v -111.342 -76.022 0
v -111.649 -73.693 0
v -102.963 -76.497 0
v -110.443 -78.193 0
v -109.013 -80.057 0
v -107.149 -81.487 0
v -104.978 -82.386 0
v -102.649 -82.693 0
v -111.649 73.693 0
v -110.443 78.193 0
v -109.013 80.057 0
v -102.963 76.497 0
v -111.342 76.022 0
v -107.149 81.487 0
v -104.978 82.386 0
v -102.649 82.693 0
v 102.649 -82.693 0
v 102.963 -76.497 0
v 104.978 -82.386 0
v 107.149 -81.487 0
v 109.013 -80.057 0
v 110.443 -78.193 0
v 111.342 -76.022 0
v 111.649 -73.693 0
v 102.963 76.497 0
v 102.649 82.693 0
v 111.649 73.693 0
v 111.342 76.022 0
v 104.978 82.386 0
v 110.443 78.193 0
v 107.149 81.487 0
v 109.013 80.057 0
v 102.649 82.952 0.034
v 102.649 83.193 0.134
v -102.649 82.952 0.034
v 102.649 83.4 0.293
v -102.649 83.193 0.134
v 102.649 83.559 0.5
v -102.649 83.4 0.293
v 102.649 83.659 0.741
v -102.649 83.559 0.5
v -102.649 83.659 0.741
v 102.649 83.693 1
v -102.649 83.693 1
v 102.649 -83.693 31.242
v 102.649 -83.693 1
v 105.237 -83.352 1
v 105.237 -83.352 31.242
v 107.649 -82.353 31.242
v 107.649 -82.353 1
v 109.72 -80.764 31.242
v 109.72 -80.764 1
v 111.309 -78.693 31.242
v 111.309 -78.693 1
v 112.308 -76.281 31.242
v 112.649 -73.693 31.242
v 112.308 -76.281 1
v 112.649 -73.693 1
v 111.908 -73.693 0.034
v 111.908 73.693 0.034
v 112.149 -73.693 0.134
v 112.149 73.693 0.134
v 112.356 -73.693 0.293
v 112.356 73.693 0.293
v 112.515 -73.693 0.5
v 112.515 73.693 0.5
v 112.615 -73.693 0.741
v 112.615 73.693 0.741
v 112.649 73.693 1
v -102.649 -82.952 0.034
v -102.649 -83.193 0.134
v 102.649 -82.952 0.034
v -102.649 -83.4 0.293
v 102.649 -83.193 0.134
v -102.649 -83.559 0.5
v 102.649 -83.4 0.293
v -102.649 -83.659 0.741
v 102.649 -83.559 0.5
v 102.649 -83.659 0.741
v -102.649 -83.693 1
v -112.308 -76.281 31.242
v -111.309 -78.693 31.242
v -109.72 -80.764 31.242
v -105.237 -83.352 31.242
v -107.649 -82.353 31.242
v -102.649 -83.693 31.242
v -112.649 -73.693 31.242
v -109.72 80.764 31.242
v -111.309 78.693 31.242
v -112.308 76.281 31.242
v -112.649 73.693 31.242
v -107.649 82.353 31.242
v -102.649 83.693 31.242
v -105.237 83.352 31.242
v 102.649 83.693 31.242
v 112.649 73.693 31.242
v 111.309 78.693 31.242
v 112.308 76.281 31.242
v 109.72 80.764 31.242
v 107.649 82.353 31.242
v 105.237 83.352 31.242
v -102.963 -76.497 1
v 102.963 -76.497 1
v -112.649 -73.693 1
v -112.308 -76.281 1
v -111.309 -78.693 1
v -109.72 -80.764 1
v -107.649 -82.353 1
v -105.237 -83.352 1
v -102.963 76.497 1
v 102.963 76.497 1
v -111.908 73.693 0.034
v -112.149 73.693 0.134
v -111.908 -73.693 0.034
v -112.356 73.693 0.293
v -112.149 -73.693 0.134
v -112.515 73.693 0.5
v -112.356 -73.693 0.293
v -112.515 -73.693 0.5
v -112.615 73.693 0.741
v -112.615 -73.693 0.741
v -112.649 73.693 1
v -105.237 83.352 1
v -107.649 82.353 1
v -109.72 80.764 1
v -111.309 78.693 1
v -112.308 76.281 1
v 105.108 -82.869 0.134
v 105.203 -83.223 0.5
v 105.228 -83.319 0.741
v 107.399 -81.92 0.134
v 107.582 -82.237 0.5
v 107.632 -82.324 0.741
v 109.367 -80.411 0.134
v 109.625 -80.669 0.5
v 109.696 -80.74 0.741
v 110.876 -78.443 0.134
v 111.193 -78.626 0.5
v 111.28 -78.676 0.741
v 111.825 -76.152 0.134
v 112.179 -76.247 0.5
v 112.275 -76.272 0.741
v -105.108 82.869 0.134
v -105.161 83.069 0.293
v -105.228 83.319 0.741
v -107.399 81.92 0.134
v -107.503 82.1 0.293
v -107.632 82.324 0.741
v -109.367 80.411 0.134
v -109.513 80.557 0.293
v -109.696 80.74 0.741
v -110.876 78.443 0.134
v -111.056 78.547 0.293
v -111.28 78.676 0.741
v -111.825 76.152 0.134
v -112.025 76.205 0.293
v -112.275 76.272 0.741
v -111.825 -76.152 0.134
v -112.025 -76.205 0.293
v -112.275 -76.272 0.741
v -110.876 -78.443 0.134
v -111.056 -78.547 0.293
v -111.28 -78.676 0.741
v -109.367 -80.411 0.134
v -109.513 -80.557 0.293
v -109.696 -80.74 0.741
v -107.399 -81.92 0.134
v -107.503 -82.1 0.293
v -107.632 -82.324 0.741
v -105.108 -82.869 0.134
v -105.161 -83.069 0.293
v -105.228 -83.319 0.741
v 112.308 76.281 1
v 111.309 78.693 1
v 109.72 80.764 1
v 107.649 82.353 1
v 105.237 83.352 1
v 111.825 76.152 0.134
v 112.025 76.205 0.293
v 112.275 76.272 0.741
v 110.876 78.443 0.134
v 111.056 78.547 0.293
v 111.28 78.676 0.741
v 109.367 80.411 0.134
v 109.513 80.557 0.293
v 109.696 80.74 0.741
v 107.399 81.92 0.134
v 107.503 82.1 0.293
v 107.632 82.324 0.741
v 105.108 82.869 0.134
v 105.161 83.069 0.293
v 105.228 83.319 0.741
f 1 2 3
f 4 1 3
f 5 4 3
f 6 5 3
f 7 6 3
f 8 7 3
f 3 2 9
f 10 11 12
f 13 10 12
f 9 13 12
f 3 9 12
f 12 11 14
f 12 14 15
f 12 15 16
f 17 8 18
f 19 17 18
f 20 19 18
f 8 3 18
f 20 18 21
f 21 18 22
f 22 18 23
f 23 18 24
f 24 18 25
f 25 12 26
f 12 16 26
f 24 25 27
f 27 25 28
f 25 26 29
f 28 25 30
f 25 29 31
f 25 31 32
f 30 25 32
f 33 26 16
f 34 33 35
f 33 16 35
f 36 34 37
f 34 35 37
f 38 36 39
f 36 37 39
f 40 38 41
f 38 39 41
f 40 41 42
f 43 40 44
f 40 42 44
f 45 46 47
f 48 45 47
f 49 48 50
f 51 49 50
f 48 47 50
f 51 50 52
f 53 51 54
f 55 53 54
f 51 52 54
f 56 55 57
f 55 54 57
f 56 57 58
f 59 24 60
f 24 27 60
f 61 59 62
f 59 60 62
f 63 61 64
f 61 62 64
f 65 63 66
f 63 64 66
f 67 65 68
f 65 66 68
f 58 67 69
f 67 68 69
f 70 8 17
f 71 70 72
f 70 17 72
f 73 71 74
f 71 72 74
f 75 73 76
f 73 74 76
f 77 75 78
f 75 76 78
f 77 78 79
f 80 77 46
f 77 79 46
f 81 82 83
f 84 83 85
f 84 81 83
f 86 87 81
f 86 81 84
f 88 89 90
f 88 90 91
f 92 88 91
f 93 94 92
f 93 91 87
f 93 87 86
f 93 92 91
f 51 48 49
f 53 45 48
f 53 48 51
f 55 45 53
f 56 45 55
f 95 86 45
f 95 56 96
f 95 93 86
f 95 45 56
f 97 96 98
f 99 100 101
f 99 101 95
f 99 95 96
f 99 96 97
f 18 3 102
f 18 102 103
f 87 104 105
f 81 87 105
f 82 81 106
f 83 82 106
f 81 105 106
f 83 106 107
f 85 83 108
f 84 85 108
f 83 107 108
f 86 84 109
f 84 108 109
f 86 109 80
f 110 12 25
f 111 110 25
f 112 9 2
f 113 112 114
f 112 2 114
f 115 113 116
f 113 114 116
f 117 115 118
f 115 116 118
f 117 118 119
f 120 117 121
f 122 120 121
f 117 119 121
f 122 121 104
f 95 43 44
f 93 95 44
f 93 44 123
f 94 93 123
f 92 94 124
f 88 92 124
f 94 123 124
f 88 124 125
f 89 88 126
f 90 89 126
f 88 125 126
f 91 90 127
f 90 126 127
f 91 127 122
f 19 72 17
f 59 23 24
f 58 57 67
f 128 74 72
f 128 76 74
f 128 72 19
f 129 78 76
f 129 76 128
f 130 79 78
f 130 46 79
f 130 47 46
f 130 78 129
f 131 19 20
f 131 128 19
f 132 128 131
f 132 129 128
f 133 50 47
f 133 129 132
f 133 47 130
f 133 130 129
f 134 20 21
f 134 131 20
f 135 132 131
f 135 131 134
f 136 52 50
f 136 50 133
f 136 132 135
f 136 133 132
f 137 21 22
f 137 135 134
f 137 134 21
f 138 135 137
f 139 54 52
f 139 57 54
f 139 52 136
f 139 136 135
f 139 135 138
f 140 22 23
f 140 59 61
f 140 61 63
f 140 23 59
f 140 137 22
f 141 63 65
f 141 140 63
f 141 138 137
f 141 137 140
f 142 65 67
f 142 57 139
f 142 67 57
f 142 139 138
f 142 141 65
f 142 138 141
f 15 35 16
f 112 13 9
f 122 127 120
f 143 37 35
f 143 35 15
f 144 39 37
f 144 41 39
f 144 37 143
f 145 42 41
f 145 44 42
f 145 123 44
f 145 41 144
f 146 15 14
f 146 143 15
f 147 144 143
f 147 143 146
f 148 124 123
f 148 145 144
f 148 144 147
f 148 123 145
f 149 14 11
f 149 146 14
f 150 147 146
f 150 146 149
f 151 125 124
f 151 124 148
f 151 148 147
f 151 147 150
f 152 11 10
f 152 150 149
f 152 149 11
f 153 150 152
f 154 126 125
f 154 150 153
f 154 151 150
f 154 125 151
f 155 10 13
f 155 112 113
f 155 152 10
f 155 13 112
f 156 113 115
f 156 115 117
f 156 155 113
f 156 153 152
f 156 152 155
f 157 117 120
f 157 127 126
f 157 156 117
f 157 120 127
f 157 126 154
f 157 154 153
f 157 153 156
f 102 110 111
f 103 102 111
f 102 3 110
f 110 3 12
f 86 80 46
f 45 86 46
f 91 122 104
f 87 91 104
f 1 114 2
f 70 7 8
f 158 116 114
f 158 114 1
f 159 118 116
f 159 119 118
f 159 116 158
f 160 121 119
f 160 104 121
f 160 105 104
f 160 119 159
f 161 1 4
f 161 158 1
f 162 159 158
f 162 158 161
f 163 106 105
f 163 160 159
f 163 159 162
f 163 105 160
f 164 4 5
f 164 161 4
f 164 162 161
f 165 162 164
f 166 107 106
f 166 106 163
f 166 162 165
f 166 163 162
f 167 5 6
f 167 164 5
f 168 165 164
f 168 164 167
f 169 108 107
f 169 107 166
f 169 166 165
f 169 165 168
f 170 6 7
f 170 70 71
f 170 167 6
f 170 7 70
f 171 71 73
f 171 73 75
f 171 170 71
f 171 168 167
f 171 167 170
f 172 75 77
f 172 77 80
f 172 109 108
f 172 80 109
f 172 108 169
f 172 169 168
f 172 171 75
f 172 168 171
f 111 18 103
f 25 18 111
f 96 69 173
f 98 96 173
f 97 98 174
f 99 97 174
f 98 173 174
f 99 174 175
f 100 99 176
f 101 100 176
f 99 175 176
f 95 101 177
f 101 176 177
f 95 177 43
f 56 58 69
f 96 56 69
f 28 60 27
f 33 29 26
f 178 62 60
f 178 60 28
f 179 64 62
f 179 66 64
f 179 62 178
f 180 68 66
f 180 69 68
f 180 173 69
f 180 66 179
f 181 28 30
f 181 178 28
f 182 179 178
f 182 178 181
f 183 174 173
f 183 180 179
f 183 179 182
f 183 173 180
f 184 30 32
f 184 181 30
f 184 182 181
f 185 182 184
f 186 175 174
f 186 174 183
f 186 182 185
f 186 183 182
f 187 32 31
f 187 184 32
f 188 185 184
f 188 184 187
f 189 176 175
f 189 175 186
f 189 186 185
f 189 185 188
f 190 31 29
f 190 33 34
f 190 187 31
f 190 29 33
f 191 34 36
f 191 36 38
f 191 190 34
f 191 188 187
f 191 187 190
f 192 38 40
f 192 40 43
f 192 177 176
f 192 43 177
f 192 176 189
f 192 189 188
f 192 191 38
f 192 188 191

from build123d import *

# Parameters (mm, degrees)
BOSS_EXTRU_2_DEPTH      = 31.242
ESQUISSE1_6_W           = 205.926380568
ESQUISSE1_6_H           = 152.99378218
ENL_V_MAT_EXTRU_3_DEPTH = 1
CONG_2_R                = 1


with BuildPart() as part:
    # Esquisse1 → Boss.-Extru.2 (new body)
    with BuildSketch(Plane.XY):
        with BuildLine():
            Line((-102.649, -83.693), (102.649, -83.693))
            ThreePointArc((102.649, -83.693), (109.720067812, -80.764067812), (112.649, -73.693))
            Line((112.649, -73.693), (112.649, 73.693))
            ThreePointArc((112.649, 73.693), (109.720067812, 80.764067812), (102.649, 83.693))
            Line((102.649, 83.693), (-102.649, 83.693))
            ThreePointArc((-102.649, 83.693), (-109.720067812, 80.764067812), (-112.649, 73.693))
            Line((-112.649, 73.693), (-112.649, -73.693))
            ThreePointArc((-112.649, -73.693), (-109.720067812, -80.764067812), (-102.649, -83.693))
        make_face()
    extrude(amount=BOSS_EXTRU_2_DEPTH)

    # Esquisse1_6 → Enl_v. mat.-Extru.3 (cut)
    with BuildSketch(Plane.XY):
        Rectangle(ESQUISSE1_6_W, ESQUISSE1_6_H)
    extrude(amount=ENL_V_MAT_EXTRU_3_DEPTH, mode=Mode.SUBTRACT)

    # Cong_2
    cong_2_edges = [part.edges().sort_by_distance(p)[0] for p in [
        (112.649, 0, 0),
        (109.720067812, 80.764067812, 0),
        (0, 83.693, 0),
        (-109.720067812, 80.764067812, 0),
        (-112.649, 0, 0),
        (-109.720067812, -80.764067812, 0),
        (0, -83.693, 0),
        (109.720067812, -80.764067812, 0),
    ]]
    fillet(cong_2_edges, radius=CONG_2_R)


solid = part.part
